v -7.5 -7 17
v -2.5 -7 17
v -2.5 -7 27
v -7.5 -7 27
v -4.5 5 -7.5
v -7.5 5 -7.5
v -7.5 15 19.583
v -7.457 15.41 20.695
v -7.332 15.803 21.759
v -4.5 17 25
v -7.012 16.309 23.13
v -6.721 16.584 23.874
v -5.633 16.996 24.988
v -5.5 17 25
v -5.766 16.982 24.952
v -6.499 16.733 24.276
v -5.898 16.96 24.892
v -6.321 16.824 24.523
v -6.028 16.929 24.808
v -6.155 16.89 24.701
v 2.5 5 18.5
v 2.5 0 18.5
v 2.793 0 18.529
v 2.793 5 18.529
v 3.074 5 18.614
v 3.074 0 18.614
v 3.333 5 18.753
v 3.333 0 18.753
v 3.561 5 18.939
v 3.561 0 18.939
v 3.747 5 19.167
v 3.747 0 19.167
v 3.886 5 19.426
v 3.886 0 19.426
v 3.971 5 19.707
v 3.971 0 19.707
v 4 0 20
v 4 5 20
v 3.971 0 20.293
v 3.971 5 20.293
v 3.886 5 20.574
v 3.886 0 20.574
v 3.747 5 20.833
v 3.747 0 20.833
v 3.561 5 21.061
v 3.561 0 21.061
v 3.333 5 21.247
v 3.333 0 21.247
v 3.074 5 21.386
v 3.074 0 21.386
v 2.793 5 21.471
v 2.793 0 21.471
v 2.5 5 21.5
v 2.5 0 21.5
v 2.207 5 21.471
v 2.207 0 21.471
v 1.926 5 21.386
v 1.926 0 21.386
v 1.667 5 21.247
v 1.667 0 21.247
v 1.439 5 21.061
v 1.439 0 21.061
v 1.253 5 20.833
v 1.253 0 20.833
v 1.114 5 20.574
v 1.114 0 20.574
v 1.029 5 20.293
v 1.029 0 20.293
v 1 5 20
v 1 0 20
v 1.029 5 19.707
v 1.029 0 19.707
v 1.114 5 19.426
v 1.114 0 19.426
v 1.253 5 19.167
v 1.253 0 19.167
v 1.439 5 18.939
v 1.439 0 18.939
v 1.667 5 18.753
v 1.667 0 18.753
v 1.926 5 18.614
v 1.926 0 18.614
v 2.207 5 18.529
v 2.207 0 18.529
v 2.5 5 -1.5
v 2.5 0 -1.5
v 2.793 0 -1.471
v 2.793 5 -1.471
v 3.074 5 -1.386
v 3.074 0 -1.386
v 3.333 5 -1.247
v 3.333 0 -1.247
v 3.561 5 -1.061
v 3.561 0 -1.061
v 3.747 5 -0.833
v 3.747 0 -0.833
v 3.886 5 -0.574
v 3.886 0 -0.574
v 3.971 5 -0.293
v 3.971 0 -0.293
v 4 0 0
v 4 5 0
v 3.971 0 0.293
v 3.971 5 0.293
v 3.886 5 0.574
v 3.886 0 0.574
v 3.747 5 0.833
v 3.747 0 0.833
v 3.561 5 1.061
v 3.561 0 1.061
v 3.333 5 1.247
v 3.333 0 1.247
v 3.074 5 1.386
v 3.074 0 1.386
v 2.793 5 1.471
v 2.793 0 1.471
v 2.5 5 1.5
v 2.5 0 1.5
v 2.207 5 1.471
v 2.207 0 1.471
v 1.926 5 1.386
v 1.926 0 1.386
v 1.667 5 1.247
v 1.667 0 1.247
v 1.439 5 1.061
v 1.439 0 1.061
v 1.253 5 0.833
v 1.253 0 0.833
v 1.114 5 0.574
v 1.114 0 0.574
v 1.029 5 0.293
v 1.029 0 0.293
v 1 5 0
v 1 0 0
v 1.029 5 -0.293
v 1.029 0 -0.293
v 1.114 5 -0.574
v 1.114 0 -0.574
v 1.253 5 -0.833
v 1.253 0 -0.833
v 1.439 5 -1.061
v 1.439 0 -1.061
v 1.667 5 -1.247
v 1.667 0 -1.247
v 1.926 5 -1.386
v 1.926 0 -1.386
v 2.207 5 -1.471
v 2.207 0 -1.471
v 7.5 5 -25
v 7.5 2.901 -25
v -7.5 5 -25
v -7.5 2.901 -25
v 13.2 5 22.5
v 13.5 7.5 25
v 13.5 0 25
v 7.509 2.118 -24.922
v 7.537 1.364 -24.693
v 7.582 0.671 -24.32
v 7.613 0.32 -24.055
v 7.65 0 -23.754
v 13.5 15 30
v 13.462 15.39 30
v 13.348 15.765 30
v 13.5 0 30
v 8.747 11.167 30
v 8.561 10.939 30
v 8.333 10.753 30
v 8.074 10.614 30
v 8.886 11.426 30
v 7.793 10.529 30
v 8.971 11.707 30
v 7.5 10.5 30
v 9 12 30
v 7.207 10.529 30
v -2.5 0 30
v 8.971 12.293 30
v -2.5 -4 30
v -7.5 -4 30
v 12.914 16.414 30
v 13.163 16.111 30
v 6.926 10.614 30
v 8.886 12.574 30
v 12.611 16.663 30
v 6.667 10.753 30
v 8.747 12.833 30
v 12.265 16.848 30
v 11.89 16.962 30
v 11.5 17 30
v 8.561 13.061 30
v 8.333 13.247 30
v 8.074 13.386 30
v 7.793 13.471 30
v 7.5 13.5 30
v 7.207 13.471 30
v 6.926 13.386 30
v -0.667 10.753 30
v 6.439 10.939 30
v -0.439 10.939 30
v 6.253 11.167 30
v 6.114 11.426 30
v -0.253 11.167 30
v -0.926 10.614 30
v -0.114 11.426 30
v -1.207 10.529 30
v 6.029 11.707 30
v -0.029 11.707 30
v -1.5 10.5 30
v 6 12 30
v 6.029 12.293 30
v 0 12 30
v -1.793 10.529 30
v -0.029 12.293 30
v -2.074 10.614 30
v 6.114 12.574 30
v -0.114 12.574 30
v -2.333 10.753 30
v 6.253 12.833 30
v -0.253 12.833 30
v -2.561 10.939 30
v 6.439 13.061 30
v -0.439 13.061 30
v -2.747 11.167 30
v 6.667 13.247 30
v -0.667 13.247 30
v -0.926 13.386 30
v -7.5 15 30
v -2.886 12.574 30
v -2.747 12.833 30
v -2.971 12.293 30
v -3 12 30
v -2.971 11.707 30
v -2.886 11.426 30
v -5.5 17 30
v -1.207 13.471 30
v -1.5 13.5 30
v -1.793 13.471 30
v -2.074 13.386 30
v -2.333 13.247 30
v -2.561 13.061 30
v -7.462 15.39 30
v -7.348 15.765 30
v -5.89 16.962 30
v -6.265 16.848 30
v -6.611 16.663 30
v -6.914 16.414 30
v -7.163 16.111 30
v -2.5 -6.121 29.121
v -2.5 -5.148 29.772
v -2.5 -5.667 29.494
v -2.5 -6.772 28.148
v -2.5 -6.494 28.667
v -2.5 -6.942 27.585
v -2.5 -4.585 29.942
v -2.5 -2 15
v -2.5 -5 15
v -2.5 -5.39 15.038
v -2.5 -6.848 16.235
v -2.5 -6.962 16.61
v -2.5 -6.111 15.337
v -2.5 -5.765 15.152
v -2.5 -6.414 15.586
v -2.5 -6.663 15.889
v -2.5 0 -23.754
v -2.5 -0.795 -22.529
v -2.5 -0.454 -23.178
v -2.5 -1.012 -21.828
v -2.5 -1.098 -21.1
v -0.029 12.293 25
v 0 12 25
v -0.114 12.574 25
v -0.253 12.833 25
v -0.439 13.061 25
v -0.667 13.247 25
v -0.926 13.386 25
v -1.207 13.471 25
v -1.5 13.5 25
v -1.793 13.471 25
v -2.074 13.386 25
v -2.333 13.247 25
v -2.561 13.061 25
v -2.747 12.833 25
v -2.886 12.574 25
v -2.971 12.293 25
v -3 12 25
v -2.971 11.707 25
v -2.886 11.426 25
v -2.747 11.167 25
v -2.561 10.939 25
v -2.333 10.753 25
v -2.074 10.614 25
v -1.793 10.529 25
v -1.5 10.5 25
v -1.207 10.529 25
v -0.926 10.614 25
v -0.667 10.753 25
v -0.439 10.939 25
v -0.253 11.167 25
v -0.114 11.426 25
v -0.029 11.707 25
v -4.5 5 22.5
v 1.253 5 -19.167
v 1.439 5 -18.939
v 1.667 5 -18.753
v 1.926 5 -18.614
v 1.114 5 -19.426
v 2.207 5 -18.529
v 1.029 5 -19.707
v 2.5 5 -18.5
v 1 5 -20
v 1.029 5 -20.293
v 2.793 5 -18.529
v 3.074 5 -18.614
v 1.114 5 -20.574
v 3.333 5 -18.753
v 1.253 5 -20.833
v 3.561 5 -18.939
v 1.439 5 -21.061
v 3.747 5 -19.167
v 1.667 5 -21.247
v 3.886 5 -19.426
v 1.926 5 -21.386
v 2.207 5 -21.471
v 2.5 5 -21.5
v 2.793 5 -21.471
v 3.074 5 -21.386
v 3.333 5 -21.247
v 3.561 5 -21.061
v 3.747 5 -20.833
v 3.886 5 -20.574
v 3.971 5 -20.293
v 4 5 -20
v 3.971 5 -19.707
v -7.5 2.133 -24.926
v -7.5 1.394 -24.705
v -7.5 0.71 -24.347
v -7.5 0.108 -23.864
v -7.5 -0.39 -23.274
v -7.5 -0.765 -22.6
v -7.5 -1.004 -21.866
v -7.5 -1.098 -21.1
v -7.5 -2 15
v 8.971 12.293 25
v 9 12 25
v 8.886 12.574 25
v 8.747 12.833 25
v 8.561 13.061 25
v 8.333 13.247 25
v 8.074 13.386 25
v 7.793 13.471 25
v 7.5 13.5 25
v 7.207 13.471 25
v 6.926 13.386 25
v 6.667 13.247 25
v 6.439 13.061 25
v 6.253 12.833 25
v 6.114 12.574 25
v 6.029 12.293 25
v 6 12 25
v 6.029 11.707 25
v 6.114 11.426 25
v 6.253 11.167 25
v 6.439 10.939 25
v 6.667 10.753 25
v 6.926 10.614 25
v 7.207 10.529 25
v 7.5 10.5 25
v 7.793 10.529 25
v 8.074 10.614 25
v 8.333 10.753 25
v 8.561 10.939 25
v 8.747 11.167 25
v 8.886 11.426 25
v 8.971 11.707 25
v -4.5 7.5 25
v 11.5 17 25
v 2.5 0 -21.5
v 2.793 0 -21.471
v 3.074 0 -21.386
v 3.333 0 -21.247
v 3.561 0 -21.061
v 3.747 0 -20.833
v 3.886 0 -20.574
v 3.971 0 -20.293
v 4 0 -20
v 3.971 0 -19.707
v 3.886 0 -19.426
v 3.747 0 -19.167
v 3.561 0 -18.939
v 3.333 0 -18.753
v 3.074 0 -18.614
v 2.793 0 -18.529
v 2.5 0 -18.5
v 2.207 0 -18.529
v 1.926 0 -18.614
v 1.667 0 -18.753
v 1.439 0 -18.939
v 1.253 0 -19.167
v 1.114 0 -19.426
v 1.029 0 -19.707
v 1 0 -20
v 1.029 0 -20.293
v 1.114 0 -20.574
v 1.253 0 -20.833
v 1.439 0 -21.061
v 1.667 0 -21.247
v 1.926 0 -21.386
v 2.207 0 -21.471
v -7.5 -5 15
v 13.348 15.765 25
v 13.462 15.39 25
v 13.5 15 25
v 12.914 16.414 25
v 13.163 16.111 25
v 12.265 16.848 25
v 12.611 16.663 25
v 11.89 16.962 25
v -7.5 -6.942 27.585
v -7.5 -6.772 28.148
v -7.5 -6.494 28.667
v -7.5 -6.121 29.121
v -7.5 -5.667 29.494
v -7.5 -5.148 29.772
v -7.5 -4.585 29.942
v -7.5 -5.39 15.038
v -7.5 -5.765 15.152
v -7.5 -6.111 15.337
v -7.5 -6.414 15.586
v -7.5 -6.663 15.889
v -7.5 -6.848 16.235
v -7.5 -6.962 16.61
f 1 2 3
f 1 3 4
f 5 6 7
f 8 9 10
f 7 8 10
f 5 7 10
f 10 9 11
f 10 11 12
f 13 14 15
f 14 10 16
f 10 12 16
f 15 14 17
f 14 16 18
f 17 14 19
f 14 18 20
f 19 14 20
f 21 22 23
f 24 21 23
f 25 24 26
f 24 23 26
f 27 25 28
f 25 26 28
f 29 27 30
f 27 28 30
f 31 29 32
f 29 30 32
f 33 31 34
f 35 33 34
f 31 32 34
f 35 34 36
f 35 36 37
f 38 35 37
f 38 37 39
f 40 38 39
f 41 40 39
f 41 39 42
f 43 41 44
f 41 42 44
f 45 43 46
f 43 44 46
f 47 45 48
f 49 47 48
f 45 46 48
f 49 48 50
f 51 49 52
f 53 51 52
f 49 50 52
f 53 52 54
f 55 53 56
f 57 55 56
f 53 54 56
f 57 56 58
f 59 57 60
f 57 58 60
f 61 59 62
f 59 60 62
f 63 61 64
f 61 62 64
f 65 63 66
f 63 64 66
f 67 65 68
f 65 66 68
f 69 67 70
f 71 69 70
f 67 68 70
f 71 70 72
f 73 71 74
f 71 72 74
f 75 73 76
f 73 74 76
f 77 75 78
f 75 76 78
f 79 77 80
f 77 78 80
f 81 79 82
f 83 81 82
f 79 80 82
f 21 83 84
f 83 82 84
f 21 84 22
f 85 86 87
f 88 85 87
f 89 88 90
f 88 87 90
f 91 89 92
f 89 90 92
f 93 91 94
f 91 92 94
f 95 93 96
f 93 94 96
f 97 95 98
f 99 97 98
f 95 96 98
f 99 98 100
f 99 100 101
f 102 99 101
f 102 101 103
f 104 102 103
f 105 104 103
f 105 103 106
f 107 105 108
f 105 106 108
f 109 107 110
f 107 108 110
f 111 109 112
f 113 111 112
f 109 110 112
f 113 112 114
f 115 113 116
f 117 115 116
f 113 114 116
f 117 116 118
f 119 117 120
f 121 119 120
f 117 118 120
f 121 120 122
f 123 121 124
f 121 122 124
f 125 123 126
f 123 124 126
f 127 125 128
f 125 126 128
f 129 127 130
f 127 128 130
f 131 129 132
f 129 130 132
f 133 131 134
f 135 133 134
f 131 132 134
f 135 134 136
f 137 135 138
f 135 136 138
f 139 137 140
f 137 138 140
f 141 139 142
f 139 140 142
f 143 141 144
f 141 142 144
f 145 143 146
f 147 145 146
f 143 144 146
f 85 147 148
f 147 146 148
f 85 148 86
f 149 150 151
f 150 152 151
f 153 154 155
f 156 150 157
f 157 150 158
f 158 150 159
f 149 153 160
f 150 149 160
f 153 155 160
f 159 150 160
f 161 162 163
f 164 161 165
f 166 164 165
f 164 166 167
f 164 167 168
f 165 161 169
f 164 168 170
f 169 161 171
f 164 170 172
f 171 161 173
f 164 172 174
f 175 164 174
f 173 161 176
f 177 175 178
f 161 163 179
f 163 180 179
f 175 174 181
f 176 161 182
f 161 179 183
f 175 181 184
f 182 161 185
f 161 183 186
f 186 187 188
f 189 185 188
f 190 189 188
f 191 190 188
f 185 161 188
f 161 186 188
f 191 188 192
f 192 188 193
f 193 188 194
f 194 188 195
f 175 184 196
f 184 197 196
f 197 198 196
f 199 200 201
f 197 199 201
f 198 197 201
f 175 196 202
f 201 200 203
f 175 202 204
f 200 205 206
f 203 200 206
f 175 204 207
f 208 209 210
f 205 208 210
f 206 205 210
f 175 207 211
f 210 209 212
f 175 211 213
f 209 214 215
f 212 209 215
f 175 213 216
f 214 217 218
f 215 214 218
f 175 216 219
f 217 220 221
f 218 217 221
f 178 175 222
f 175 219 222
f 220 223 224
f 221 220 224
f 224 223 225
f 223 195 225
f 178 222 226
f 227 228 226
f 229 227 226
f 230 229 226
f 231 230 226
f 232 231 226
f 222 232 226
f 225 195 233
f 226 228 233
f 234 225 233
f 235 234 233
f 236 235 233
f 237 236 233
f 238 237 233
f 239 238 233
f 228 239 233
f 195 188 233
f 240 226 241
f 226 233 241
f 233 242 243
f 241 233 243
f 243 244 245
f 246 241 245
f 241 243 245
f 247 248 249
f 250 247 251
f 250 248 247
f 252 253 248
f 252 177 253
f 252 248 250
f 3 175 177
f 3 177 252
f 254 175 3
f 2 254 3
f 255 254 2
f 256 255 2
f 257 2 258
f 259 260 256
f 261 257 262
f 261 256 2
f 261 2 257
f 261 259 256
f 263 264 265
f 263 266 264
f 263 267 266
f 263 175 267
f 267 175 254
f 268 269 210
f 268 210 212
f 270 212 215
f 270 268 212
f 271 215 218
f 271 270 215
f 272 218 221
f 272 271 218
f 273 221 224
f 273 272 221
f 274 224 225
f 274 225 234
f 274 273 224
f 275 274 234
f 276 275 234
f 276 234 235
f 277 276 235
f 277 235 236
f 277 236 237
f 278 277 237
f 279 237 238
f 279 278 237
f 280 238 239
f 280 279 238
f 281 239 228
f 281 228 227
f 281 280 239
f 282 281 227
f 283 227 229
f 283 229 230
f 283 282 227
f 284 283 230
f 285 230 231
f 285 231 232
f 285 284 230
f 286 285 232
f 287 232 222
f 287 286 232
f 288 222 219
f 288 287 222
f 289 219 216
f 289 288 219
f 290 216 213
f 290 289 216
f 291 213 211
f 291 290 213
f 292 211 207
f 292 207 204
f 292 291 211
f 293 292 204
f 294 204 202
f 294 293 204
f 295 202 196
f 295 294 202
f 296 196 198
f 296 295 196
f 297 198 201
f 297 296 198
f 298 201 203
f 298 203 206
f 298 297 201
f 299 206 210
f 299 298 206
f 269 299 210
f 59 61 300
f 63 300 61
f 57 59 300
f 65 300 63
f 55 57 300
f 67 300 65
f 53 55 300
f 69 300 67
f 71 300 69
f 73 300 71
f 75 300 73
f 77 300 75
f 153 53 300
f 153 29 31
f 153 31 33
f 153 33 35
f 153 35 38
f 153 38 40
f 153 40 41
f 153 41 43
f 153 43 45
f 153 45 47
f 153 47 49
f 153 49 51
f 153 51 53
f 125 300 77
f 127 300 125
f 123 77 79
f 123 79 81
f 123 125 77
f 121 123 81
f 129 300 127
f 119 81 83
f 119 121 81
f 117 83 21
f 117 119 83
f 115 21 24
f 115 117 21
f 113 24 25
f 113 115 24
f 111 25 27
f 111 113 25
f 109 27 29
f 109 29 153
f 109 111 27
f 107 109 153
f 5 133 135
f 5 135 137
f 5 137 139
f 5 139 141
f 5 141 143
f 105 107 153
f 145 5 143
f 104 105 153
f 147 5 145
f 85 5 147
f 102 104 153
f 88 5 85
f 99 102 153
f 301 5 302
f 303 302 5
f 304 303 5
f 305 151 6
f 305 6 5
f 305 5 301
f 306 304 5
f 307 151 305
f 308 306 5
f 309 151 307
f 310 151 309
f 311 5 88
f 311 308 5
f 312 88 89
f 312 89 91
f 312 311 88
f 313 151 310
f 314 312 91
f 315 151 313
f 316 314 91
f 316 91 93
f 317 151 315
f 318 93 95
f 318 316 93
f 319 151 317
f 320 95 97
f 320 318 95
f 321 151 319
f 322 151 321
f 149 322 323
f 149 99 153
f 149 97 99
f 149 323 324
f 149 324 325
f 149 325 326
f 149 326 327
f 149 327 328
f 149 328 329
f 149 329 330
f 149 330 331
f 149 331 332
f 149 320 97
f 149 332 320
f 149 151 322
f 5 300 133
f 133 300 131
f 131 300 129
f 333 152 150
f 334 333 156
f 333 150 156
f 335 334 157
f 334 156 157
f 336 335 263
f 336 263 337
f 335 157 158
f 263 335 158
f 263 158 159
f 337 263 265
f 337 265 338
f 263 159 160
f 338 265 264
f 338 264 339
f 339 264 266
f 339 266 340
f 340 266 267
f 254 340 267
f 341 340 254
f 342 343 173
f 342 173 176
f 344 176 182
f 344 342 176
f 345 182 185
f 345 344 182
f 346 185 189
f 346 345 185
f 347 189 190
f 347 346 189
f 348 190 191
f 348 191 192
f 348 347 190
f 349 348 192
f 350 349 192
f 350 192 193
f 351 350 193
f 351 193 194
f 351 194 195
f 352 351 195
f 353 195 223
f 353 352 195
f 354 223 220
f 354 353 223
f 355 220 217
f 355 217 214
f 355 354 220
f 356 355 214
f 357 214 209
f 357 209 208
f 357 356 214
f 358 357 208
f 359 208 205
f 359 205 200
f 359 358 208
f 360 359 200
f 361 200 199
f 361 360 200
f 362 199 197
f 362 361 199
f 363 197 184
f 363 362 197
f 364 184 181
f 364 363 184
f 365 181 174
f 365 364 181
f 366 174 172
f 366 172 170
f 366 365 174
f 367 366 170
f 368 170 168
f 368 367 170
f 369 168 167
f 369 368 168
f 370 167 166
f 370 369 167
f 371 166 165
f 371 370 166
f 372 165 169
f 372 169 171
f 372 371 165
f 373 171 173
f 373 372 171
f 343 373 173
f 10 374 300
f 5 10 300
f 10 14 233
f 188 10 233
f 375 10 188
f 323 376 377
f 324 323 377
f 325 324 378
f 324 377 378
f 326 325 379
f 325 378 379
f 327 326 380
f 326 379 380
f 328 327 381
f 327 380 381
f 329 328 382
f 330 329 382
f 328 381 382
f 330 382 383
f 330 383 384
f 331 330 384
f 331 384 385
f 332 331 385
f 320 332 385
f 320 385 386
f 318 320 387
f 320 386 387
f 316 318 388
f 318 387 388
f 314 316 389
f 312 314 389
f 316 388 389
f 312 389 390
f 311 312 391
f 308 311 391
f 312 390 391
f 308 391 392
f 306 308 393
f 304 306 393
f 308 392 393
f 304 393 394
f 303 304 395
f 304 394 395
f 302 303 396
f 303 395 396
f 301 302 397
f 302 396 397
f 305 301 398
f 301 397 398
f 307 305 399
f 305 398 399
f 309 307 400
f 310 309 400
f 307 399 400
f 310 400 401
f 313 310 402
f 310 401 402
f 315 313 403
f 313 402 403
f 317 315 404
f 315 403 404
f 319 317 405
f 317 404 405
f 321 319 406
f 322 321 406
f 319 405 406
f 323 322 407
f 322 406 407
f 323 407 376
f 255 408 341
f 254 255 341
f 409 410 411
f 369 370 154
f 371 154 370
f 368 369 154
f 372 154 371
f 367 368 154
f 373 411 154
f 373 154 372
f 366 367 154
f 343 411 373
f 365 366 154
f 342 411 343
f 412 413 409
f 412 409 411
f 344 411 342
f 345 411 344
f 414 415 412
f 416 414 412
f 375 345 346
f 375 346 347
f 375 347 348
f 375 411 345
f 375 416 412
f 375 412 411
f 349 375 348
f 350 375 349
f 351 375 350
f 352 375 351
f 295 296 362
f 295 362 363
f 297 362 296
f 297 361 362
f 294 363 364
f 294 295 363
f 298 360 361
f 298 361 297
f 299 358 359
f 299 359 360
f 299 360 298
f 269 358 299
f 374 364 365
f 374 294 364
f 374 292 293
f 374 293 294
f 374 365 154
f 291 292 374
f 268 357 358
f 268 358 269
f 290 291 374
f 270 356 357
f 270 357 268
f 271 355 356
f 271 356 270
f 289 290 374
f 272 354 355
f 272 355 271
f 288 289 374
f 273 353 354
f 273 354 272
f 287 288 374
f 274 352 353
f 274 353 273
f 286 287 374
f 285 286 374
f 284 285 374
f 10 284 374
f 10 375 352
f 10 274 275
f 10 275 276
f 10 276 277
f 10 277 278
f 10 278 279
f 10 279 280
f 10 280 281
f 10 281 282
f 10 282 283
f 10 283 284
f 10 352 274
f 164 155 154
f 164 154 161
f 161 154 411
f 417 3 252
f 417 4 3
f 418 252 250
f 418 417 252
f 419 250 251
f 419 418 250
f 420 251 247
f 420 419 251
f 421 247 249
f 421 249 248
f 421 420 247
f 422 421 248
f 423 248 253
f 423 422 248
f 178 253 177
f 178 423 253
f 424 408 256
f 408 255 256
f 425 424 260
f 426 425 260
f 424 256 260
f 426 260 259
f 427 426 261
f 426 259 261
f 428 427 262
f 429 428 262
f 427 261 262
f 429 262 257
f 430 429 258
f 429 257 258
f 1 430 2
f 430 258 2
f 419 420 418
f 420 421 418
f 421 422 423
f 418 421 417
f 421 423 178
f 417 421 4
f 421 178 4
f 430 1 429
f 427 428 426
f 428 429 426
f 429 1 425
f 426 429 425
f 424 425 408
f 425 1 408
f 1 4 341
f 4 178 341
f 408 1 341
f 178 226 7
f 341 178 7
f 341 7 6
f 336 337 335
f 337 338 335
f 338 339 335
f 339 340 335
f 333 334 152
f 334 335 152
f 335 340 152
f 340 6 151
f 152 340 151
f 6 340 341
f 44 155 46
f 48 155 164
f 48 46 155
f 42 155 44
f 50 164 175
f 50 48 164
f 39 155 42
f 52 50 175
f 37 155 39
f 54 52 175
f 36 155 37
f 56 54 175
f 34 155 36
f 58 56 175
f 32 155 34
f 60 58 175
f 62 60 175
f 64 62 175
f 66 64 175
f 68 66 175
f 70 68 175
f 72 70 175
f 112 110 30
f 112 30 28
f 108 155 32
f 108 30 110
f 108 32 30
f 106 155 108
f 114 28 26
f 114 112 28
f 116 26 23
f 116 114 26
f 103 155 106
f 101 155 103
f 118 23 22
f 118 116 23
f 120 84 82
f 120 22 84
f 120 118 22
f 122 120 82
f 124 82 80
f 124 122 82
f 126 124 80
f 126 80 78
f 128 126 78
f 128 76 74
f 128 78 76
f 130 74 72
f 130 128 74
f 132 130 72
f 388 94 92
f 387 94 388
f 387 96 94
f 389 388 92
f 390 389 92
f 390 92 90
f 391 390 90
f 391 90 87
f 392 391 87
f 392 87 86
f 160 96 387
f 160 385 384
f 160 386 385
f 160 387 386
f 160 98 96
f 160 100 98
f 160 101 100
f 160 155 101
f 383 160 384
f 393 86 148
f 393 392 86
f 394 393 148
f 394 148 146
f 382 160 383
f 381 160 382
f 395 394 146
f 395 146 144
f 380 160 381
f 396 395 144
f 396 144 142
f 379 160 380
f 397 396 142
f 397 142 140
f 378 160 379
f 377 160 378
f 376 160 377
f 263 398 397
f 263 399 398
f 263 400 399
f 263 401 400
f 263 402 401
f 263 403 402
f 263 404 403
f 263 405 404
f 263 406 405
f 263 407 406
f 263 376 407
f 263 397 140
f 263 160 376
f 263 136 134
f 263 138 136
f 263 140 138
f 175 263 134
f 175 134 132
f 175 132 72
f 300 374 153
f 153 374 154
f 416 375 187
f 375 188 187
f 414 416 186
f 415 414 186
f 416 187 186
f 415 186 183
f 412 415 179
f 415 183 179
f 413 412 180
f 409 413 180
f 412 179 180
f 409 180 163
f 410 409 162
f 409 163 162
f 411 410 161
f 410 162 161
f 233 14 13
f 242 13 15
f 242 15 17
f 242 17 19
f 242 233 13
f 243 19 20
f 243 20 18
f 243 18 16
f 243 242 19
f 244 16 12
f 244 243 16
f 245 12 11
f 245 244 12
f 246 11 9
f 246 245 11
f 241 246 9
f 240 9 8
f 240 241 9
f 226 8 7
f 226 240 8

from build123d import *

# Parameters (mm, degrees)
SKETCH_1_W          = 15
SKETCH_1_H          = 50
EXTRUDE_1_DEPTH     = 5
SKETCH_3_W          = 50
SKETCH_3_H          = 1
SKETCH_3_W_2        = 10
SKETCH_3_H_2        = 5
EXTRUDE_2_DEPTH     = 5
FILLET_1_R          = 4
FILLET_2_R          = 2
SKETCH_4_R          = 1.5
CUT_EXTRUDE_1_DEPTH = 5
SKETCH_5_R          = 1.5
EXTRUDE_3_DEPTH     = 5
CHAMFER_1_SIZE      = 2.5
FILLET_4_R          = 3
EXTRUDE_4_DEPTH     = 3
FILLET_5_R          = 2


with BuildPart() as part:
    # 草图1 → 凸台-拉伸1 (new body)
    with BuildSketch(Plane(origin=(0, 0, 0), x_dir=(1, 0, 0), z_dir=(0, 1, 0))):
        Rectangle(SKETCH_1_W, SKETCH_1_H)
        Polygon((7.5, -25), (13.5, -25), (7.5, 25), align=None)
    extrude(amount=EXTRUDE_1_DEPTH)

    # 草图3 → 凸台-拉伸2 (add)
    with BuildSketch(Plane.ZY.offset(7.5)):
        with Locations((0, -0.5)):
            Rectangle(SKETCH_3_W, SKETCH_3_H)
        Polygon((15, -2), (25, -2), (25, -1), (-25, -1), align=None)
        with Locations((20, -4.5)):
            Rectangle(SKETCH_3_W_2, SKETCH_3_H_2)
    extrude(amount=-EXTRUDE_2_DEPTH)

    # 圆角1
    fillet_1_edges = [part.edges().sort_by_distance(p)[0] for p in [
        (-5, -1, -25),
    ]]
    fillet(fillet_1_edges, radius=FILLET_1_R)

    # 圆角2
    fillet_2_edges = [part.edges().sort_by_distance(p)[0] for p in [
        (-5, -7, 15),
    ]]
    fillet(fillet_2_edges, radius=FILLET_2_R)

    # 草图4 → 切除-拉伸1 (cut)
    with BuildSketch(Plane.XZ):
        with Locations(Location((2.5, 20, 0), (0, 0, 270))):
            Circle(SKETCH_4_R)
        with Locations(Location((2.5, 0, 0), (0, 0, 270))):
            Circle(SKETCH_4_R)
        with Locations(Location((2.5, -20, 0), (0, 0, 270))):
            Circle(SKETCH_4_R)
    extrude(amount=-CUT_EXTRUDE_1_DEPTH, mode=Mode.SUBTRACT)

    # 草图5 → 凸台-拉伸3 (add)
    with BuildSketch(Plane.XY.offset(25)):
        Polygon((13.5, 5), (13.5, 0), (-2.5, 0), (-2.5, -7), (-7.5, -7), (-7.5, 5), (-7.5, 17), (13.5, 17), align=None)
        with Locations((-1.5, 12)):
            Circle(SKETCH_5_R, mode=Mode.SUBTRACT)
        with Locations((7.5, 12)):
            Circle(SKETCH_5_R, mode=Mode.SUBTRACT)
    extrude(amount=EXTRUDE_3_DEPTH)

    # 倒角1
    chamfer_1_edges = [part.edges().sort_by_distance(p)[0] for p in [
        (3, 5, 25),
    ]]
    chamfer(chamfer_1_edges, length=CHAMFER_1_SIZE)

    # 圆角4
    fillet_4_edges = [part.edges().sort_by_distance(p)[0] for p in [
        (-5, -7, 30),
    ]]
    fillet(fillet_4_edges, radius=FILLET_4_R)

    # 草图6 → 凸台-拉伸4 (add)
    with BuildSketch(Plane.ZY.offset(7.5)):
        Polygon((25, 17), (25, 7.5), (22.5, 5), (-7.5, 5), align=None)
    extrude(amount=-EXTRUDE_4_DEPTH)

    # 圆角5
    fillet_5_edges = [part.edges().sort_by_distance(p)[0] for p in [
        (13.5, 17, 27.5),
        (-7.5, 17, 27.5),
    ]]
    fillet(fillet_5_edges, radius=FILLET_5_R)


solid = part.part
